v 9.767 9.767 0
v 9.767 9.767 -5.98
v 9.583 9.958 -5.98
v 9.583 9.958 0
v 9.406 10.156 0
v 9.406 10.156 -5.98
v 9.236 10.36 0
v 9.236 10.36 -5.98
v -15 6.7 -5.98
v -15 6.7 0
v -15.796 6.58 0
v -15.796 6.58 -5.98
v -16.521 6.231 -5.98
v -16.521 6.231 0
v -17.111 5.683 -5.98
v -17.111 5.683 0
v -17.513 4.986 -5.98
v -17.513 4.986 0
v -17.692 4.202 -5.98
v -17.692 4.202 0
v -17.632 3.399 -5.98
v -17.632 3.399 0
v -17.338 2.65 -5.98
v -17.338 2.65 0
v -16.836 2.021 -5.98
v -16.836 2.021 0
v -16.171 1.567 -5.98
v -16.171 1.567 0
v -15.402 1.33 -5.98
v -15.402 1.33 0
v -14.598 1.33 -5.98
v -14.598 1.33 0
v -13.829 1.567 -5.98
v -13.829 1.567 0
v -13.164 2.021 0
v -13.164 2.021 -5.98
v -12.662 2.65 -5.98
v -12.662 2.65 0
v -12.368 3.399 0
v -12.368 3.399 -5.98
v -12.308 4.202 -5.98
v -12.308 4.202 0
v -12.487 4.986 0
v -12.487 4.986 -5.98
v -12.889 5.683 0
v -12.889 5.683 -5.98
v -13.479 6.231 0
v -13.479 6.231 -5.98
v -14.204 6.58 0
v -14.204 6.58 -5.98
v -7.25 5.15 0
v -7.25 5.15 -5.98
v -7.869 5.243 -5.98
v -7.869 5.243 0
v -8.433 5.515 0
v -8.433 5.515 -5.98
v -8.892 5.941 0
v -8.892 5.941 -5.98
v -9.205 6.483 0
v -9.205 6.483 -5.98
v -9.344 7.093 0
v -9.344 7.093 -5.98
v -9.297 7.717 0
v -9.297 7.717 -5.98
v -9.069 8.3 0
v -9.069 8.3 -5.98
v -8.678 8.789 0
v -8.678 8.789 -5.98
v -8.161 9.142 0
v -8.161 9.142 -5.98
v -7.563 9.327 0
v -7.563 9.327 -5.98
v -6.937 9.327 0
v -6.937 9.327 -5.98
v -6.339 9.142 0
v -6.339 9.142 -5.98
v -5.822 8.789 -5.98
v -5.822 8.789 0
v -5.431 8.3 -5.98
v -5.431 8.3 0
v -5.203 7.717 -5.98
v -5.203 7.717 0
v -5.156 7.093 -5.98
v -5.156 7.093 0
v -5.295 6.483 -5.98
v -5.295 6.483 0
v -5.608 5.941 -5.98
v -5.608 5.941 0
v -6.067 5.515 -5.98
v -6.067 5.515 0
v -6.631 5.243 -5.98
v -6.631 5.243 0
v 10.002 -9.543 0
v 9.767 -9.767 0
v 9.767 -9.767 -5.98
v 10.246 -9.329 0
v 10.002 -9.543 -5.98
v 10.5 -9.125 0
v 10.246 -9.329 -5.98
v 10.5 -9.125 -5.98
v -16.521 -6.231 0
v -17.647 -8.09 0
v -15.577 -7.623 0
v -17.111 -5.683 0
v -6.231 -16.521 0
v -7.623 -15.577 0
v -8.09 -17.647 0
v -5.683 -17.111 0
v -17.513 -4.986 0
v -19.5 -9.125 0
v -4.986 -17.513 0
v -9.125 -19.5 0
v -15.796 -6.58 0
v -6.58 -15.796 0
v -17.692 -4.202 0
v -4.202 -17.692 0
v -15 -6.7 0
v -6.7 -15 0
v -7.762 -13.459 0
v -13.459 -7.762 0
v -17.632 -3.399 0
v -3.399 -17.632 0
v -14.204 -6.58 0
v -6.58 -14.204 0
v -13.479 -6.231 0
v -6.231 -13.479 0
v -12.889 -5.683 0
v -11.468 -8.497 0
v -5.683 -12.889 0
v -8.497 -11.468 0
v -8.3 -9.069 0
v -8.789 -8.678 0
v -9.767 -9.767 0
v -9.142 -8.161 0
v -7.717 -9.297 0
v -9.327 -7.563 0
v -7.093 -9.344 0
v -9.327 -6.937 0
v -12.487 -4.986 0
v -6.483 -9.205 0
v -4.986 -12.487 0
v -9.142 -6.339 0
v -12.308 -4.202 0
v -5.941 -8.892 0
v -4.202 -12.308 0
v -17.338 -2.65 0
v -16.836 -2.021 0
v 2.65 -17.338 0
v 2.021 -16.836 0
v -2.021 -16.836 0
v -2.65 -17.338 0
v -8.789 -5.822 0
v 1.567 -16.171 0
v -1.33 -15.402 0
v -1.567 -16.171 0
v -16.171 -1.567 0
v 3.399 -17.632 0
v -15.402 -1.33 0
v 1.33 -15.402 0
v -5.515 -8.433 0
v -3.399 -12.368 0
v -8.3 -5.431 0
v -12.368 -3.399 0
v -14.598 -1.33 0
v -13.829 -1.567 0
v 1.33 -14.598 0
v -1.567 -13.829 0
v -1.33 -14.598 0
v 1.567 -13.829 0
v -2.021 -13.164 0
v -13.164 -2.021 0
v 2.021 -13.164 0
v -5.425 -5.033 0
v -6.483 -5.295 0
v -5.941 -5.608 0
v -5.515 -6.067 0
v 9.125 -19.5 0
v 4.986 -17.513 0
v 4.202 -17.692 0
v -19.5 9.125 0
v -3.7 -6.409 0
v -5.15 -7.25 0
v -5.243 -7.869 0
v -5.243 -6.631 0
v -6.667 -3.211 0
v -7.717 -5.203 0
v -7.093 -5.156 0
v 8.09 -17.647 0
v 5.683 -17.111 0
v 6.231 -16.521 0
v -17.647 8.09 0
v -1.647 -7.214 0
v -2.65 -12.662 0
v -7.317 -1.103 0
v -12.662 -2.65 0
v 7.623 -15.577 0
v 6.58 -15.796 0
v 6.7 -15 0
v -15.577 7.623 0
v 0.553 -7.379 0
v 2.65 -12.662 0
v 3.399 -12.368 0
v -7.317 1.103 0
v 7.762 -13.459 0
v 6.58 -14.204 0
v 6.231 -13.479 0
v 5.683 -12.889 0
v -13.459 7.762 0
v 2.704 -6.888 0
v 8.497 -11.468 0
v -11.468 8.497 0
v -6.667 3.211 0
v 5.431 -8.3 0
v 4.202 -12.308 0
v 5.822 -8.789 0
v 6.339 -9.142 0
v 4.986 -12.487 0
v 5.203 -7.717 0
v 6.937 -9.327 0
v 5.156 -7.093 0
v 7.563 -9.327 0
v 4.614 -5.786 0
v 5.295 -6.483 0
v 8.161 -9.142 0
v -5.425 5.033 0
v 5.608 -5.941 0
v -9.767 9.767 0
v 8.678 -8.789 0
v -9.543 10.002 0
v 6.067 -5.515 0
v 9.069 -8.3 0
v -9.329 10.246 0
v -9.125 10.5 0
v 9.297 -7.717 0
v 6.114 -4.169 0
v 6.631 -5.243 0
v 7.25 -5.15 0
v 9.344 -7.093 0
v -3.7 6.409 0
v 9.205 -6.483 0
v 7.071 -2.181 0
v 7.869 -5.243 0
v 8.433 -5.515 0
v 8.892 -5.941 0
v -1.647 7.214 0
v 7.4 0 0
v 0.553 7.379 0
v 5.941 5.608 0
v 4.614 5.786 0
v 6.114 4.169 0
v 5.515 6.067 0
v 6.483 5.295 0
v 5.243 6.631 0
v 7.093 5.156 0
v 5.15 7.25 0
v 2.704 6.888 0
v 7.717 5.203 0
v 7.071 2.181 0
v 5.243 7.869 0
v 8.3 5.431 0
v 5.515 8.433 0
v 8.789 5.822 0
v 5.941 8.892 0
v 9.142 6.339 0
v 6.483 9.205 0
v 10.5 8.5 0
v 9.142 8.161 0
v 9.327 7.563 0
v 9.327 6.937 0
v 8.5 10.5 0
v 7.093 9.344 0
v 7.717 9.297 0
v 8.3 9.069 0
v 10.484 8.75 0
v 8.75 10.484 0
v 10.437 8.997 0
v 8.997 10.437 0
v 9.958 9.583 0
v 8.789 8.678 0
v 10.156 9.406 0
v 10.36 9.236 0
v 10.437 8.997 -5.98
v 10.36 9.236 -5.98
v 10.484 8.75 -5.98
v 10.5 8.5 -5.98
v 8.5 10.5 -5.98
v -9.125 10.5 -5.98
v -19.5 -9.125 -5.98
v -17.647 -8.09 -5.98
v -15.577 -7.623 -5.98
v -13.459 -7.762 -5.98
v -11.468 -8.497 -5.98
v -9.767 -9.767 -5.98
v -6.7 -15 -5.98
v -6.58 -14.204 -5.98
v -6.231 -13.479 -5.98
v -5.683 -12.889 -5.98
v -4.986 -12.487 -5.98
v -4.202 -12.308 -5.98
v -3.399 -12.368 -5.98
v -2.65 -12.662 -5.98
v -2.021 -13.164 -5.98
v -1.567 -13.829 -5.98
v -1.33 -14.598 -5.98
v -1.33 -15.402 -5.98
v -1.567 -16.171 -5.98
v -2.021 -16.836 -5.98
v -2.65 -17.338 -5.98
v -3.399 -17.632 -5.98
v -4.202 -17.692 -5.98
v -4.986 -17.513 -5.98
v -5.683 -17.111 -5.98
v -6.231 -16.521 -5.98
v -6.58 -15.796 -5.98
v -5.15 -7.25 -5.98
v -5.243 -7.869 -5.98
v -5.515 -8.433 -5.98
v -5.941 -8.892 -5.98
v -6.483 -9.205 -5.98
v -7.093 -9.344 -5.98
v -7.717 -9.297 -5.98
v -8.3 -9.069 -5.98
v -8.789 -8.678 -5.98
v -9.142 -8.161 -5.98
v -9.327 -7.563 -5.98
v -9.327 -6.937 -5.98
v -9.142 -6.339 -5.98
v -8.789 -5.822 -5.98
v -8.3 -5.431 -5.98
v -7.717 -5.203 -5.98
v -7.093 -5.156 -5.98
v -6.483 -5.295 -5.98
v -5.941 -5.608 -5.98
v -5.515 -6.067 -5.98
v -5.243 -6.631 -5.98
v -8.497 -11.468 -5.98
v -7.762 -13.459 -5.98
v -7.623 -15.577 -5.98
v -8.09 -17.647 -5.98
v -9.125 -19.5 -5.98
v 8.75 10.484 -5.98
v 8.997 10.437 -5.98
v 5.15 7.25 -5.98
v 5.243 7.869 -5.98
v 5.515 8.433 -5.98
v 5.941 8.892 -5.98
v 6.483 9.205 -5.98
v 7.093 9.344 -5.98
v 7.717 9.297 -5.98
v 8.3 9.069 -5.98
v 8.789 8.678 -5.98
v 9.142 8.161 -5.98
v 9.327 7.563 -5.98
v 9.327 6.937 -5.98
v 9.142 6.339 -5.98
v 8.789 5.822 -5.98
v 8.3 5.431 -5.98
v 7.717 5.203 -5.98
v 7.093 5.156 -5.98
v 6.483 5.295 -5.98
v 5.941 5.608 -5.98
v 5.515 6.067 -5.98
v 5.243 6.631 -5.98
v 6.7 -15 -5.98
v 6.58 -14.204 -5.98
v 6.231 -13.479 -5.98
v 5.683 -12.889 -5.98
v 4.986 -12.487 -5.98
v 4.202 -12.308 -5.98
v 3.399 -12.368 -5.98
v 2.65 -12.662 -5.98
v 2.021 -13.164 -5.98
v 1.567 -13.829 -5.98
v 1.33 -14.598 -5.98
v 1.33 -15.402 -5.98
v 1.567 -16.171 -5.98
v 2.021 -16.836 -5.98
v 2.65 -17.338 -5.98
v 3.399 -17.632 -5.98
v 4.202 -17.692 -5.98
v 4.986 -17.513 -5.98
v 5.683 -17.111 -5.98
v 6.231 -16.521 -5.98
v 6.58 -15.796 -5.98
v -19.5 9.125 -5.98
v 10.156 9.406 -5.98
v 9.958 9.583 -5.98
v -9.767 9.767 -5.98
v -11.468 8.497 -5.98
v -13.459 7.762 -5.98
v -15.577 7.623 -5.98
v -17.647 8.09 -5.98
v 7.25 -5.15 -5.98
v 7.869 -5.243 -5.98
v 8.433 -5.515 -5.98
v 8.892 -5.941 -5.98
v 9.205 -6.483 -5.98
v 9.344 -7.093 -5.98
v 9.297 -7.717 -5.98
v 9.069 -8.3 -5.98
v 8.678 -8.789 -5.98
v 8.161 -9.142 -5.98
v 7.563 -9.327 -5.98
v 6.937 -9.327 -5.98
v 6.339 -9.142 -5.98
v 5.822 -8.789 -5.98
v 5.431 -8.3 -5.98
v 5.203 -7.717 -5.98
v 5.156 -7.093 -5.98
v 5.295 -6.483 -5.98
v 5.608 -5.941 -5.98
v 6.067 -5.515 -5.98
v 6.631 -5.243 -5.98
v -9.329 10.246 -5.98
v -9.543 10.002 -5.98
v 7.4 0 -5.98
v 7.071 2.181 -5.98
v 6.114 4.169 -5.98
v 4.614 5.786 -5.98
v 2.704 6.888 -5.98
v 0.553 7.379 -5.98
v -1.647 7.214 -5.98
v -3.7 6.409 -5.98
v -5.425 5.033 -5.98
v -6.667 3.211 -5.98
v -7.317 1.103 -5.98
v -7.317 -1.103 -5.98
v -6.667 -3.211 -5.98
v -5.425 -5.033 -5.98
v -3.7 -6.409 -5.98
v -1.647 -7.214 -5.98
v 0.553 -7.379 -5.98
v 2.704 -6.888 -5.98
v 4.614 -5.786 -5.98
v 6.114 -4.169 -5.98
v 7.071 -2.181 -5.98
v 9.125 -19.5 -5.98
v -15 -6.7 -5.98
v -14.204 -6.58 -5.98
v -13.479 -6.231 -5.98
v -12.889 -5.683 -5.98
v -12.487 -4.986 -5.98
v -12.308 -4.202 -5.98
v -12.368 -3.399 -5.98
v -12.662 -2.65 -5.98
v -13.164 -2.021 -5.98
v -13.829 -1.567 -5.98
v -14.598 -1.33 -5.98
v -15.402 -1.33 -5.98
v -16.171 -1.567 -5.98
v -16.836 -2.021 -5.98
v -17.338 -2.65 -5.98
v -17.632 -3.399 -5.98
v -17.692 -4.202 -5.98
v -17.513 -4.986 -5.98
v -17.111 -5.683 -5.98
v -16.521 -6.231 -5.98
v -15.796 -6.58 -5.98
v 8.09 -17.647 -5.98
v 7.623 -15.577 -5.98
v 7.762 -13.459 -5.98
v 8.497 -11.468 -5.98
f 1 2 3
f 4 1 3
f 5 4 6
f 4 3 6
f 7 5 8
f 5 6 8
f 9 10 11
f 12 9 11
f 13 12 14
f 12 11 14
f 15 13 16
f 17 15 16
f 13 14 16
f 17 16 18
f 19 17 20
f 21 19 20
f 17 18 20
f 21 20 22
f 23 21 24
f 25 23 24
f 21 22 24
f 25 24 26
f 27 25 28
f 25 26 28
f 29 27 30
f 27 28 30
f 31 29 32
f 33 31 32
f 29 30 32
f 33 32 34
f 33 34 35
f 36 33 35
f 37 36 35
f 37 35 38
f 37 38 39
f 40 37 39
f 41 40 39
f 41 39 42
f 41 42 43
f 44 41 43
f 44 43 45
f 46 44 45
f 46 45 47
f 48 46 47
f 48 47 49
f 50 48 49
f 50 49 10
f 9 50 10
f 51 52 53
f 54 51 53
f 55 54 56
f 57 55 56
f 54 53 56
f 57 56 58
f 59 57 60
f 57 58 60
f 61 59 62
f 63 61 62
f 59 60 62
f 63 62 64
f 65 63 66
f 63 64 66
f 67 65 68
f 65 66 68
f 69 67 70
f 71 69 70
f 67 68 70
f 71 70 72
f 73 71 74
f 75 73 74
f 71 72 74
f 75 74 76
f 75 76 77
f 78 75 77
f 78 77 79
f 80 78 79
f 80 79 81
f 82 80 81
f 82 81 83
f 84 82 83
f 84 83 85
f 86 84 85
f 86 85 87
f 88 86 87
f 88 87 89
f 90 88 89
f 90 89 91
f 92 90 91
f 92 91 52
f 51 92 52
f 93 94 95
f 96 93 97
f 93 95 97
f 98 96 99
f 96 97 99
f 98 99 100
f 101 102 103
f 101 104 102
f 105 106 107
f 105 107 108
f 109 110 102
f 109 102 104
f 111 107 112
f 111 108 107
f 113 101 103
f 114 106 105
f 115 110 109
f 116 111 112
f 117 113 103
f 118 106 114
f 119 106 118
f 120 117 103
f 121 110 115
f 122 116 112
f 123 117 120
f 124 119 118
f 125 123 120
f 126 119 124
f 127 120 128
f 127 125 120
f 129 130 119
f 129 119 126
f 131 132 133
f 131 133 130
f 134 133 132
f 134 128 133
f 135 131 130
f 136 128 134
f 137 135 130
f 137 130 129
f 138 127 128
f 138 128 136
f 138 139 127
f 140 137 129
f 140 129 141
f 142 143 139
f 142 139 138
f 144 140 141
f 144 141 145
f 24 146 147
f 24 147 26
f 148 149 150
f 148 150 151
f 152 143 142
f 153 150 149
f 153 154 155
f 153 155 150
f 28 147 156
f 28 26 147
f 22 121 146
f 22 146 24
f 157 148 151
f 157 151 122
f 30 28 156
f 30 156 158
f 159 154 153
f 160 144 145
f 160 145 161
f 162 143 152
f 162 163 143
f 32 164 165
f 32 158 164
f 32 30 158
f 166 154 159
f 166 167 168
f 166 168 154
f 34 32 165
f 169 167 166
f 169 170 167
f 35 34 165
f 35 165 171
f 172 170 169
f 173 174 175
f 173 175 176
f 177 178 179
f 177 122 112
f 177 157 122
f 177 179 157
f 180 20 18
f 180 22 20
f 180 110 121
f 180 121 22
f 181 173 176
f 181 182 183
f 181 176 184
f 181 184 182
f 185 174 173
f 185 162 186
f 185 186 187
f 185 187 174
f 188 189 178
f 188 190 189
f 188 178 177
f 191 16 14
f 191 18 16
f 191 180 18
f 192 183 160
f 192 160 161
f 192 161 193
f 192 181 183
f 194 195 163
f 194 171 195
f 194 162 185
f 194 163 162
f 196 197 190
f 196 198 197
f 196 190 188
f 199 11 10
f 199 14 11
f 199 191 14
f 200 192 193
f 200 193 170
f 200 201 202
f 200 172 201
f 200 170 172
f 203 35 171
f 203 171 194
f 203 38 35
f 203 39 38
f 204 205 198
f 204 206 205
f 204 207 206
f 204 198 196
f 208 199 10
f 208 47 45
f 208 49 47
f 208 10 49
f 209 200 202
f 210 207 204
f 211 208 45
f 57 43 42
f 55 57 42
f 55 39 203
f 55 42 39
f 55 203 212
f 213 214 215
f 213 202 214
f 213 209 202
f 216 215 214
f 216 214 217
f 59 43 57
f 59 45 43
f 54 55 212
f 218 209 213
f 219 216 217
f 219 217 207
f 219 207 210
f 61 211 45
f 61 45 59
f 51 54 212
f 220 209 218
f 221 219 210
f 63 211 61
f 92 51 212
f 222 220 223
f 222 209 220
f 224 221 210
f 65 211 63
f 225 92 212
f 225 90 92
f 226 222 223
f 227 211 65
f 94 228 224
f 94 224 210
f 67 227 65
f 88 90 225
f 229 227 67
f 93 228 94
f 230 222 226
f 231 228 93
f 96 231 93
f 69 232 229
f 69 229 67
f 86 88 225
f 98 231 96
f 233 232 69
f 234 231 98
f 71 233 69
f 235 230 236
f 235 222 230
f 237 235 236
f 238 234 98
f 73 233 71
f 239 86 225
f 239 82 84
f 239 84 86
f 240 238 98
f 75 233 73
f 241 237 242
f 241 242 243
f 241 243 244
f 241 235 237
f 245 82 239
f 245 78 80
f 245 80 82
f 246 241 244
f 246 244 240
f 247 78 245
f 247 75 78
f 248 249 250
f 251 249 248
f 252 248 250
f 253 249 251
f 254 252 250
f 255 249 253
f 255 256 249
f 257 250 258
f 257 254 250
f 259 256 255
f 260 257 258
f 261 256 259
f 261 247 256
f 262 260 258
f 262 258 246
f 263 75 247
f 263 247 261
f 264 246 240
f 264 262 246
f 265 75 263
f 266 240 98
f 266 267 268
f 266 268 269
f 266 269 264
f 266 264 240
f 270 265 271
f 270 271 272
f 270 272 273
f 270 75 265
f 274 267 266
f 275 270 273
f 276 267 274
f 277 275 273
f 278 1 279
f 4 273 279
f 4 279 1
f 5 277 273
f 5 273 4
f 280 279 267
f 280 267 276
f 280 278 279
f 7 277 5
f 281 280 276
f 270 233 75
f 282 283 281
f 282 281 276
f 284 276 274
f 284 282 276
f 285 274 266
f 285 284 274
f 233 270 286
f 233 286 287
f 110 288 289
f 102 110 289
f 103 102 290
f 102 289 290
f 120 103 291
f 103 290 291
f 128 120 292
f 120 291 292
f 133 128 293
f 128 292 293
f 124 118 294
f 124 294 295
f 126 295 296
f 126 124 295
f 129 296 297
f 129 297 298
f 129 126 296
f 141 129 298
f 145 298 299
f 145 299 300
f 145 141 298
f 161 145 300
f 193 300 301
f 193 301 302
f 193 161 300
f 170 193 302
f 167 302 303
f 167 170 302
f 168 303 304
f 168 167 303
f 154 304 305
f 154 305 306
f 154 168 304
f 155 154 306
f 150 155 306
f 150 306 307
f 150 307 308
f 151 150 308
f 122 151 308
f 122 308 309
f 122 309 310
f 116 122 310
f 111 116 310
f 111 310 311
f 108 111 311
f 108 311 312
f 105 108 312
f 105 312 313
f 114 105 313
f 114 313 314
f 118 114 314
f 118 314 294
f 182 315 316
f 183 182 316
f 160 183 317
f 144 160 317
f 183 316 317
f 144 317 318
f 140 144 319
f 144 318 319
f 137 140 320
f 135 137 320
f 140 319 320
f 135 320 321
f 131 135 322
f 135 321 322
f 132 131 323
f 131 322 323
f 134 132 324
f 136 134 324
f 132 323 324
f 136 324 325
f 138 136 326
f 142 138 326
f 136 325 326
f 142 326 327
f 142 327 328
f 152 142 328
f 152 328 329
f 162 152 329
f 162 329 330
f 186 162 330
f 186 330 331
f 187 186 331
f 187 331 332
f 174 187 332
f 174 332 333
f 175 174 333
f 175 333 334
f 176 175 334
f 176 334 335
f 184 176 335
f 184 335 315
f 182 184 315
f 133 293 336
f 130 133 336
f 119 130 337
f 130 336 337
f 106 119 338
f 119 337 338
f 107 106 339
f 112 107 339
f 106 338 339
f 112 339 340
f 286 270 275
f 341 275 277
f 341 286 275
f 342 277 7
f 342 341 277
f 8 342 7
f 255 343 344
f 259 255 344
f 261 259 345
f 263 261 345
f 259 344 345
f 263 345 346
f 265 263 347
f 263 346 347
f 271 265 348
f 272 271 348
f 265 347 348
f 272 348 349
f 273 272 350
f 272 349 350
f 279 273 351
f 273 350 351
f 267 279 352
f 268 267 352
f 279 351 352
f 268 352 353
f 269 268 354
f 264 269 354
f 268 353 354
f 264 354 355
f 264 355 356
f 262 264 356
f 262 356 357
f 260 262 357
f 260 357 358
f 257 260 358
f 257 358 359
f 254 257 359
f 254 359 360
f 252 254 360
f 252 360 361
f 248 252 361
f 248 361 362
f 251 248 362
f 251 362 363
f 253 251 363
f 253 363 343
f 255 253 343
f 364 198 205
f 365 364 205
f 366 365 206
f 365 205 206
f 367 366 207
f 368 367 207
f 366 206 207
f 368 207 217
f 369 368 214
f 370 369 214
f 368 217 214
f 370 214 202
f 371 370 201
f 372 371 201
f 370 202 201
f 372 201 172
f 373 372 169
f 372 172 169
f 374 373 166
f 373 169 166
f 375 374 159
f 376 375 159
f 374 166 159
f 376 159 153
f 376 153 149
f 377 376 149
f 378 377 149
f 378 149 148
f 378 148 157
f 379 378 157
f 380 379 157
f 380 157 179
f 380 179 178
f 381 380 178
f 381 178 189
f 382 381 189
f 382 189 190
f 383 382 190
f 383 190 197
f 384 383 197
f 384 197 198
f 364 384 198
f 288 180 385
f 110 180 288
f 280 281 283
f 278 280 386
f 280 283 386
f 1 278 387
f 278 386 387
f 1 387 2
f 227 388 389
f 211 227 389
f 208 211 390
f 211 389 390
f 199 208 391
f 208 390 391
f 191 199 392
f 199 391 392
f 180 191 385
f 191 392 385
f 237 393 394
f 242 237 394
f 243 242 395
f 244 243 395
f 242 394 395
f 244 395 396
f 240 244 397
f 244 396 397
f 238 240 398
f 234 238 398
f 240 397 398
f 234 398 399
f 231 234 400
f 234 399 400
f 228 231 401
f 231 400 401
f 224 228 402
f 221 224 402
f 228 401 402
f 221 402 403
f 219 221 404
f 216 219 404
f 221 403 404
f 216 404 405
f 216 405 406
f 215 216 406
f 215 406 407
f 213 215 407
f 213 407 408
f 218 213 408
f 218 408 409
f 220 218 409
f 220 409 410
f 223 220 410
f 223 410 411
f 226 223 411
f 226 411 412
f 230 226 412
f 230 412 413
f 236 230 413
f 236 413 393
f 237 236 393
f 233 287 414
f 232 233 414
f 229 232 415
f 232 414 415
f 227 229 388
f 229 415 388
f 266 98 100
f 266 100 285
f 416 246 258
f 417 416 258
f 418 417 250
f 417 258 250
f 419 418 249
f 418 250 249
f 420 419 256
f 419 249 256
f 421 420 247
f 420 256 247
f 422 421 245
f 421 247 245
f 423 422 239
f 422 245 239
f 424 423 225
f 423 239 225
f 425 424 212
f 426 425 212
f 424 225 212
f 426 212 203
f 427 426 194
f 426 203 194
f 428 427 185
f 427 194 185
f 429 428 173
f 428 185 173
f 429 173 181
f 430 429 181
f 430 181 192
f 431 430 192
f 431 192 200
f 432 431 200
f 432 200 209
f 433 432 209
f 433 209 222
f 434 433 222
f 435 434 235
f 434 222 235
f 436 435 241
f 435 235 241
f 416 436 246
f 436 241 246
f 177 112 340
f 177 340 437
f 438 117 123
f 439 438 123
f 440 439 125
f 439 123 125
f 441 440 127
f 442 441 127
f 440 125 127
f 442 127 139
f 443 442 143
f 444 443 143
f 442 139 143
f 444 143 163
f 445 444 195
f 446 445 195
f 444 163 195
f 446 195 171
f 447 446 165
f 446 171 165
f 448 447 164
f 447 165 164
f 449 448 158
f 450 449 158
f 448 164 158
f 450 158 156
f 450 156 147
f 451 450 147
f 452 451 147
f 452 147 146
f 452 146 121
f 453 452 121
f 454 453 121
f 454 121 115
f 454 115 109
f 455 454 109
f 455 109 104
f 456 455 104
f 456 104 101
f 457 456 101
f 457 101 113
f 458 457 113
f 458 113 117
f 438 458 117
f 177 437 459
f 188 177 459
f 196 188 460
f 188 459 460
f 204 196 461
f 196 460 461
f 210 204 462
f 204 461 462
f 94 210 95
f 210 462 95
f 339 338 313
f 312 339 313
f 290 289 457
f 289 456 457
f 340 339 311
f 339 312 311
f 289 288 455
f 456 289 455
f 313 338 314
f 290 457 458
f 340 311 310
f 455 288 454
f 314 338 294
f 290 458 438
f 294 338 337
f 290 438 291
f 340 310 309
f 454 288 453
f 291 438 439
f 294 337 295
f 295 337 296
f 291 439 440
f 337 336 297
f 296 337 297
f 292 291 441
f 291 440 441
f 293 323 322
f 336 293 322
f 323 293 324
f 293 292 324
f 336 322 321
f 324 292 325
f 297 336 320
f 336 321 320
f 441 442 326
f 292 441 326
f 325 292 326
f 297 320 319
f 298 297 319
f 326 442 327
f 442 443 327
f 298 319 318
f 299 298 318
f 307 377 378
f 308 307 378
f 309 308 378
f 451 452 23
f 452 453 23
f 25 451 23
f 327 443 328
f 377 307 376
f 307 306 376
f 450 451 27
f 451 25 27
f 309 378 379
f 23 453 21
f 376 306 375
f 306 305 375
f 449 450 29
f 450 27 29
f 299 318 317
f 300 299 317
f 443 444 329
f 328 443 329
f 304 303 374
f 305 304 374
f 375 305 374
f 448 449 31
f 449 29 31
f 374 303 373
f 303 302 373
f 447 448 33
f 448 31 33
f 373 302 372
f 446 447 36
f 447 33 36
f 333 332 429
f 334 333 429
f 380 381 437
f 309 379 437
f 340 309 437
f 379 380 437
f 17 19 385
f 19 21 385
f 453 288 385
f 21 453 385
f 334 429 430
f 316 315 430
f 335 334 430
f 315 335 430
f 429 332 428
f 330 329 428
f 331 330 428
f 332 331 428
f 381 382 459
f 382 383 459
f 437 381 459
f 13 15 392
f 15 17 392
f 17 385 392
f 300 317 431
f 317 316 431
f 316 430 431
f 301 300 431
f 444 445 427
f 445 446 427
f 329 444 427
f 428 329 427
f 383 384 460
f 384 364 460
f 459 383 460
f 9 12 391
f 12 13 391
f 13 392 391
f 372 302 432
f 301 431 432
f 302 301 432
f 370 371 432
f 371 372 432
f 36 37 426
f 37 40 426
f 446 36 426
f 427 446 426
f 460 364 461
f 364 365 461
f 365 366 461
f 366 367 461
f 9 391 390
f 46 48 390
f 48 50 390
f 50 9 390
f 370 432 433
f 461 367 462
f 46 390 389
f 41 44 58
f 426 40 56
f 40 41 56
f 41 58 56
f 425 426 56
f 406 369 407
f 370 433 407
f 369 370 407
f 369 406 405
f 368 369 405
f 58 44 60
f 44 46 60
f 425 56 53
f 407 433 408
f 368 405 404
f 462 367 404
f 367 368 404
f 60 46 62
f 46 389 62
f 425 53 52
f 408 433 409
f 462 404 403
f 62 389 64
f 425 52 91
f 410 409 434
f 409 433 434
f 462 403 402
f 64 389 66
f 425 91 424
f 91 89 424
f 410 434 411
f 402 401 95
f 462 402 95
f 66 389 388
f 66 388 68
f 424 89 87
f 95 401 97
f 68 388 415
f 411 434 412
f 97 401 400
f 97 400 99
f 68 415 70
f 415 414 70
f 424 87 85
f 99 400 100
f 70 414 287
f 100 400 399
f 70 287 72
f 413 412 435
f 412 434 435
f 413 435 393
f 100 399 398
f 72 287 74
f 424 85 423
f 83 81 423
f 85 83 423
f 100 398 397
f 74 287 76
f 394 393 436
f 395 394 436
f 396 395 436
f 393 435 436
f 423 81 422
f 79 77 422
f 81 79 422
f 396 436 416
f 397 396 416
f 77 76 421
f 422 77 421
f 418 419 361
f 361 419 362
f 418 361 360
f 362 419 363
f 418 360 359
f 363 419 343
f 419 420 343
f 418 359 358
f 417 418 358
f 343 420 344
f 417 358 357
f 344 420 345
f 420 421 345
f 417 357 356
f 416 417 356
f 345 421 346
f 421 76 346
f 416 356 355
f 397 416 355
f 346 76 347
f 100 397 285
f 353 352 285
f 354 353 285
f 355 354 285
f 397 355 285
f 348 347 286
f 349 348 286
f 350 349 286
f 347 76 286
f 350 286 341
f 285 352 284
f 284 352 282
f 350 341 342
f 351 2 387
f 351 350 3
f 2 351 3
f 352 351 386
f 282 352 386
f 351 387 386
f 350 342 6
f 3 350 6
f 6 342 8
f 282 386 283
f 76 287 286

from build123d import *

# Parameters (mm, degrees)
SKETCH1_R                   = 7.4
BOSS_EXTRUDE1_DEPTH         = 5.98
CUT_EXTRUDE1_REACH          = 30.218
SKETCH2_R                   = 2.1
CIRPATTERN1_COUNT           = 4
FILLET1_R                   = 7
CUT_EXTRUDE2_DEPTH          = 11
FILLET2_R                   = 2
CIRPATTERN2_COUNT           = 4
CUT_EXTRUDE3_REACH          = 30.218
SKETCH4_R                   = 2.7
CIRPATTERN3_COUNT           = 2
CIRPATTERN3_ANGLE           = 90
CIRPATTERN3_COPY_1_REACH    = 30.218
CIRPATTERN3_COPY_1_SKETCH_R = 2.7


with BuildPart() as part:
    # Sketch1 → Boss-Extrude1 (new body)
    with BuildSketch(Plane.XY):
        Polygon((-10.5, -10.5), (-10.5, -19.5), (10.5, -19.5), (10.5, 10.5), (-19.5, 10.5), (-19.5, -10.5), align=None)
        Circle(SKETCH1_R, mode=Mode.SUBTRACT)
    extrude(amount=-BOSS_EXTRUDE1_DEPTH)

    # Sketch2 → Cut-Extrude1 (cut, up to next)
    with BuildSketch(Plane(origin=(0, 0, -5.98), x_dir=(-1, 0, 0), z_dir=(0, 0, -1)), mode=Mode.PRIVATE) as cut_extrude1_sk1:
        with Locations((-7.25, 7.25)):
            Circle(SKETCH2_R)
    cut_extrude1_tool1 = extrude(cut_extrude1_sk1.sketch, amount=-CUT_EXTRUDE1_REACH, mode=Mode.PRIVATE) & part.part
    cut_extrude1 = cut_extrude1_tool1.solids().sort_by_distance((7.25, 7.25, -5.98))[0]
    add(cut_extrude1, mode=Mode.SUBTRACT)

    # CirPattern1: Cut-Extrude1 ×4 about axis
    cirpattern1_axis = Axis((0, 0, 0), (0, 0, 1))
    for i in range(1, CIRPATTERN1_COUNT):
        add(cut_extrude1.rotate(cirpattern1_axis, i * 360 / CIRPATTERN1_COUNT), mode=Mode.SUBTRACT)

    # Fillet1
    fillet1_edges = [part.edges().sort_by_distance(p)[0] for p in [
        (-10.5, -10.5, -2.99),
    ]]
    fillet(fillet1_edges, radius=FILLET1_R)

    # Sketch3 → Cut-Extrude2 (cut)
    with BuildSketch(Plane(origin=(0, 0, -5.98), x_dir=(-1, 0, 0), z_dir=(0, 0, -1))):
        with BuildLine():
            ThreePointArc((19.5, -9.125478743), (14.512977444, -7.616043809), (9.767409819, -9.767409819))
            Line((9.767409819, -9.767409819), (12.550252532, -12.550252532))
            ThreePointArc((12.550252532, -12.550252532), (14.821215973, -11.032843272), (17.5, -10.5))
            Line((17.5, -10.5), (19.5, -10.5))
            Line((19.5, -10.5), (19.5, -9.125478743))
        make_face()
        with BuildLine():
            ThreePointArc((17.5, -10.5), (14.821215973, -11.032843272), (12.550252532, -12.550252532))
            Line((12.550252532, -12.550252532), (20.232590181, -20.232590181))
            ThreePointArc((20.232590181, -20.232590181), (21.836708541, -17.8318574), (22.4, -15))
            ThreePointArc((22.4, -15), (21.63551053, -11.724332129), (19.5, -9.125478743))
            Line((19.5, -9.125478743), (19.5, -10.5))
            Line((19.5, -10.5), (17.5, -10.5))
        make_face()
        with BuildLine():
            Line((12.550252532, -12.550252532), (9.767409819, -9.767409819))
            ThreePointArc((9.767409819, -9.767409819), (7.616043809, -14.512977444), (9.125478743, -19.5))
            Line((9.125478743, -19.5), (10.5, -19.5))
            Line((10.5, -19.5), (10.5, -17.5))
            ThreePointArc((10.5, -17.5), (11.032843272, -14.821215973), (12.550252532, -12.550252532))
        make_face()
        with BuildLine():
            Line((20.232590181, -20.232590181), (12.550252532, -12.550252532))
            ThreePointArc((12.550252532, -12.550252532), (11.032843272, -14.821215973), (10.5, -17.5))
            Line((10.5, -17.5), (10.5, -19.5))
            Line((10.5, -19.5), (9.125478743, -19.5))
            ThreePointArc((9.125478743, -19.5), (14.512977444, -22.383956191), (20.232590181, -20.232590181))
        make_face()
    cut_extrude2 = extrude(amount=-CUT_EXTRUDE2_DEPTH, mode=Mode.SUBTRACT)

    # Fillet2
    fillet2_edges = [part.edges().sort_by_distance(p)[0] for p in [
        (10.5, 10.5, -2.99),
    ]]
    fillet(fillet2_edges, radius=FILLET2_R)

    # CirPattern2: Cut-Extrude2 ×4 about axis
    cirpattern2_axis = Axis((0, 0, 0), (0, 0, 1))
    for i in range(1, CIRPATTERN2_COUNT):
        add(cut_extrude2.rotate(cirpattern2_axis, i * 360 / CIRPATTERN2_COUNT), mode=Mode.SUBTRACT)

    # Sketch4 → Cut-Extrude3 (cut, up to next)
    with BuildSketch(Plane.XY, mode=Mode.PRIVATE) as cut_extrude3_sk1:
        with Locations((4, -15)):
            Circle(SKETCH4_R)
    cut_extrude3_tool1 = extrude(cut_extrude3_sk1.sketch, amount=-CUT_EXTRUDE3_REACH, mode=Mode.PRIVATE) & part.part
    cut_extrude3 = cut_extrude3_tool1.solids().sort_by_distance((4, -15, 0))[0]
    add(cut_extrude3, mode=Mode.SUBTRACT)

    # Mirror1: Cut-Extrude3 across plane
    add(cut_extrude3.mirror(Plane(origin=(0, 0, 0), x_dir=(0, 0, 1), z_dir=(1, 0, 0))), mode=Mode.SUBTRACT)

    # CirPattern3: Cut-Extrude3 ×2 about axis
    cirpattern3_axis = Axis((0, 0, -48.426406871), (0, 0, -1))
    for i in range(1, CIRPATTERN3_COUNT):
        add(cut_extrude3.rotate(cirpattern3_axis, i * CIRPATTERN3_ANGLE / (CIRPATTERN3_COUNT - 1)), mode=Mode.SUBTRACT)

    # CirPattern3 copy 1 sketch → CirPattern3 copy 1 (cut, up to next)
    with BuildSketch(Plane(origin=(0, 0, 0), x_dir=(0, 1, 0), z_dir=(0, 0, 1)), mode=Mode.PRIVATE) as cirpattern3_copy_1_sk1:
        with Locations((4, 15)):
            Circle(CIRPATTERN3_COPY_1_SKETCH_R)
    cirpattern3_copy_1_tool1 = extrude(cirpattern3_copy_1_sk1.sketch, amount=-CIRPATTERN3_COPY_1_REACH, mode=Mode.PRIVATE) & part.part
    add(cirpattern3_copy_1_tool1.solids().sort_by_distance((-15, 4, 0))[0], mode=Mode.SUBTRACT)


solid = part.part
